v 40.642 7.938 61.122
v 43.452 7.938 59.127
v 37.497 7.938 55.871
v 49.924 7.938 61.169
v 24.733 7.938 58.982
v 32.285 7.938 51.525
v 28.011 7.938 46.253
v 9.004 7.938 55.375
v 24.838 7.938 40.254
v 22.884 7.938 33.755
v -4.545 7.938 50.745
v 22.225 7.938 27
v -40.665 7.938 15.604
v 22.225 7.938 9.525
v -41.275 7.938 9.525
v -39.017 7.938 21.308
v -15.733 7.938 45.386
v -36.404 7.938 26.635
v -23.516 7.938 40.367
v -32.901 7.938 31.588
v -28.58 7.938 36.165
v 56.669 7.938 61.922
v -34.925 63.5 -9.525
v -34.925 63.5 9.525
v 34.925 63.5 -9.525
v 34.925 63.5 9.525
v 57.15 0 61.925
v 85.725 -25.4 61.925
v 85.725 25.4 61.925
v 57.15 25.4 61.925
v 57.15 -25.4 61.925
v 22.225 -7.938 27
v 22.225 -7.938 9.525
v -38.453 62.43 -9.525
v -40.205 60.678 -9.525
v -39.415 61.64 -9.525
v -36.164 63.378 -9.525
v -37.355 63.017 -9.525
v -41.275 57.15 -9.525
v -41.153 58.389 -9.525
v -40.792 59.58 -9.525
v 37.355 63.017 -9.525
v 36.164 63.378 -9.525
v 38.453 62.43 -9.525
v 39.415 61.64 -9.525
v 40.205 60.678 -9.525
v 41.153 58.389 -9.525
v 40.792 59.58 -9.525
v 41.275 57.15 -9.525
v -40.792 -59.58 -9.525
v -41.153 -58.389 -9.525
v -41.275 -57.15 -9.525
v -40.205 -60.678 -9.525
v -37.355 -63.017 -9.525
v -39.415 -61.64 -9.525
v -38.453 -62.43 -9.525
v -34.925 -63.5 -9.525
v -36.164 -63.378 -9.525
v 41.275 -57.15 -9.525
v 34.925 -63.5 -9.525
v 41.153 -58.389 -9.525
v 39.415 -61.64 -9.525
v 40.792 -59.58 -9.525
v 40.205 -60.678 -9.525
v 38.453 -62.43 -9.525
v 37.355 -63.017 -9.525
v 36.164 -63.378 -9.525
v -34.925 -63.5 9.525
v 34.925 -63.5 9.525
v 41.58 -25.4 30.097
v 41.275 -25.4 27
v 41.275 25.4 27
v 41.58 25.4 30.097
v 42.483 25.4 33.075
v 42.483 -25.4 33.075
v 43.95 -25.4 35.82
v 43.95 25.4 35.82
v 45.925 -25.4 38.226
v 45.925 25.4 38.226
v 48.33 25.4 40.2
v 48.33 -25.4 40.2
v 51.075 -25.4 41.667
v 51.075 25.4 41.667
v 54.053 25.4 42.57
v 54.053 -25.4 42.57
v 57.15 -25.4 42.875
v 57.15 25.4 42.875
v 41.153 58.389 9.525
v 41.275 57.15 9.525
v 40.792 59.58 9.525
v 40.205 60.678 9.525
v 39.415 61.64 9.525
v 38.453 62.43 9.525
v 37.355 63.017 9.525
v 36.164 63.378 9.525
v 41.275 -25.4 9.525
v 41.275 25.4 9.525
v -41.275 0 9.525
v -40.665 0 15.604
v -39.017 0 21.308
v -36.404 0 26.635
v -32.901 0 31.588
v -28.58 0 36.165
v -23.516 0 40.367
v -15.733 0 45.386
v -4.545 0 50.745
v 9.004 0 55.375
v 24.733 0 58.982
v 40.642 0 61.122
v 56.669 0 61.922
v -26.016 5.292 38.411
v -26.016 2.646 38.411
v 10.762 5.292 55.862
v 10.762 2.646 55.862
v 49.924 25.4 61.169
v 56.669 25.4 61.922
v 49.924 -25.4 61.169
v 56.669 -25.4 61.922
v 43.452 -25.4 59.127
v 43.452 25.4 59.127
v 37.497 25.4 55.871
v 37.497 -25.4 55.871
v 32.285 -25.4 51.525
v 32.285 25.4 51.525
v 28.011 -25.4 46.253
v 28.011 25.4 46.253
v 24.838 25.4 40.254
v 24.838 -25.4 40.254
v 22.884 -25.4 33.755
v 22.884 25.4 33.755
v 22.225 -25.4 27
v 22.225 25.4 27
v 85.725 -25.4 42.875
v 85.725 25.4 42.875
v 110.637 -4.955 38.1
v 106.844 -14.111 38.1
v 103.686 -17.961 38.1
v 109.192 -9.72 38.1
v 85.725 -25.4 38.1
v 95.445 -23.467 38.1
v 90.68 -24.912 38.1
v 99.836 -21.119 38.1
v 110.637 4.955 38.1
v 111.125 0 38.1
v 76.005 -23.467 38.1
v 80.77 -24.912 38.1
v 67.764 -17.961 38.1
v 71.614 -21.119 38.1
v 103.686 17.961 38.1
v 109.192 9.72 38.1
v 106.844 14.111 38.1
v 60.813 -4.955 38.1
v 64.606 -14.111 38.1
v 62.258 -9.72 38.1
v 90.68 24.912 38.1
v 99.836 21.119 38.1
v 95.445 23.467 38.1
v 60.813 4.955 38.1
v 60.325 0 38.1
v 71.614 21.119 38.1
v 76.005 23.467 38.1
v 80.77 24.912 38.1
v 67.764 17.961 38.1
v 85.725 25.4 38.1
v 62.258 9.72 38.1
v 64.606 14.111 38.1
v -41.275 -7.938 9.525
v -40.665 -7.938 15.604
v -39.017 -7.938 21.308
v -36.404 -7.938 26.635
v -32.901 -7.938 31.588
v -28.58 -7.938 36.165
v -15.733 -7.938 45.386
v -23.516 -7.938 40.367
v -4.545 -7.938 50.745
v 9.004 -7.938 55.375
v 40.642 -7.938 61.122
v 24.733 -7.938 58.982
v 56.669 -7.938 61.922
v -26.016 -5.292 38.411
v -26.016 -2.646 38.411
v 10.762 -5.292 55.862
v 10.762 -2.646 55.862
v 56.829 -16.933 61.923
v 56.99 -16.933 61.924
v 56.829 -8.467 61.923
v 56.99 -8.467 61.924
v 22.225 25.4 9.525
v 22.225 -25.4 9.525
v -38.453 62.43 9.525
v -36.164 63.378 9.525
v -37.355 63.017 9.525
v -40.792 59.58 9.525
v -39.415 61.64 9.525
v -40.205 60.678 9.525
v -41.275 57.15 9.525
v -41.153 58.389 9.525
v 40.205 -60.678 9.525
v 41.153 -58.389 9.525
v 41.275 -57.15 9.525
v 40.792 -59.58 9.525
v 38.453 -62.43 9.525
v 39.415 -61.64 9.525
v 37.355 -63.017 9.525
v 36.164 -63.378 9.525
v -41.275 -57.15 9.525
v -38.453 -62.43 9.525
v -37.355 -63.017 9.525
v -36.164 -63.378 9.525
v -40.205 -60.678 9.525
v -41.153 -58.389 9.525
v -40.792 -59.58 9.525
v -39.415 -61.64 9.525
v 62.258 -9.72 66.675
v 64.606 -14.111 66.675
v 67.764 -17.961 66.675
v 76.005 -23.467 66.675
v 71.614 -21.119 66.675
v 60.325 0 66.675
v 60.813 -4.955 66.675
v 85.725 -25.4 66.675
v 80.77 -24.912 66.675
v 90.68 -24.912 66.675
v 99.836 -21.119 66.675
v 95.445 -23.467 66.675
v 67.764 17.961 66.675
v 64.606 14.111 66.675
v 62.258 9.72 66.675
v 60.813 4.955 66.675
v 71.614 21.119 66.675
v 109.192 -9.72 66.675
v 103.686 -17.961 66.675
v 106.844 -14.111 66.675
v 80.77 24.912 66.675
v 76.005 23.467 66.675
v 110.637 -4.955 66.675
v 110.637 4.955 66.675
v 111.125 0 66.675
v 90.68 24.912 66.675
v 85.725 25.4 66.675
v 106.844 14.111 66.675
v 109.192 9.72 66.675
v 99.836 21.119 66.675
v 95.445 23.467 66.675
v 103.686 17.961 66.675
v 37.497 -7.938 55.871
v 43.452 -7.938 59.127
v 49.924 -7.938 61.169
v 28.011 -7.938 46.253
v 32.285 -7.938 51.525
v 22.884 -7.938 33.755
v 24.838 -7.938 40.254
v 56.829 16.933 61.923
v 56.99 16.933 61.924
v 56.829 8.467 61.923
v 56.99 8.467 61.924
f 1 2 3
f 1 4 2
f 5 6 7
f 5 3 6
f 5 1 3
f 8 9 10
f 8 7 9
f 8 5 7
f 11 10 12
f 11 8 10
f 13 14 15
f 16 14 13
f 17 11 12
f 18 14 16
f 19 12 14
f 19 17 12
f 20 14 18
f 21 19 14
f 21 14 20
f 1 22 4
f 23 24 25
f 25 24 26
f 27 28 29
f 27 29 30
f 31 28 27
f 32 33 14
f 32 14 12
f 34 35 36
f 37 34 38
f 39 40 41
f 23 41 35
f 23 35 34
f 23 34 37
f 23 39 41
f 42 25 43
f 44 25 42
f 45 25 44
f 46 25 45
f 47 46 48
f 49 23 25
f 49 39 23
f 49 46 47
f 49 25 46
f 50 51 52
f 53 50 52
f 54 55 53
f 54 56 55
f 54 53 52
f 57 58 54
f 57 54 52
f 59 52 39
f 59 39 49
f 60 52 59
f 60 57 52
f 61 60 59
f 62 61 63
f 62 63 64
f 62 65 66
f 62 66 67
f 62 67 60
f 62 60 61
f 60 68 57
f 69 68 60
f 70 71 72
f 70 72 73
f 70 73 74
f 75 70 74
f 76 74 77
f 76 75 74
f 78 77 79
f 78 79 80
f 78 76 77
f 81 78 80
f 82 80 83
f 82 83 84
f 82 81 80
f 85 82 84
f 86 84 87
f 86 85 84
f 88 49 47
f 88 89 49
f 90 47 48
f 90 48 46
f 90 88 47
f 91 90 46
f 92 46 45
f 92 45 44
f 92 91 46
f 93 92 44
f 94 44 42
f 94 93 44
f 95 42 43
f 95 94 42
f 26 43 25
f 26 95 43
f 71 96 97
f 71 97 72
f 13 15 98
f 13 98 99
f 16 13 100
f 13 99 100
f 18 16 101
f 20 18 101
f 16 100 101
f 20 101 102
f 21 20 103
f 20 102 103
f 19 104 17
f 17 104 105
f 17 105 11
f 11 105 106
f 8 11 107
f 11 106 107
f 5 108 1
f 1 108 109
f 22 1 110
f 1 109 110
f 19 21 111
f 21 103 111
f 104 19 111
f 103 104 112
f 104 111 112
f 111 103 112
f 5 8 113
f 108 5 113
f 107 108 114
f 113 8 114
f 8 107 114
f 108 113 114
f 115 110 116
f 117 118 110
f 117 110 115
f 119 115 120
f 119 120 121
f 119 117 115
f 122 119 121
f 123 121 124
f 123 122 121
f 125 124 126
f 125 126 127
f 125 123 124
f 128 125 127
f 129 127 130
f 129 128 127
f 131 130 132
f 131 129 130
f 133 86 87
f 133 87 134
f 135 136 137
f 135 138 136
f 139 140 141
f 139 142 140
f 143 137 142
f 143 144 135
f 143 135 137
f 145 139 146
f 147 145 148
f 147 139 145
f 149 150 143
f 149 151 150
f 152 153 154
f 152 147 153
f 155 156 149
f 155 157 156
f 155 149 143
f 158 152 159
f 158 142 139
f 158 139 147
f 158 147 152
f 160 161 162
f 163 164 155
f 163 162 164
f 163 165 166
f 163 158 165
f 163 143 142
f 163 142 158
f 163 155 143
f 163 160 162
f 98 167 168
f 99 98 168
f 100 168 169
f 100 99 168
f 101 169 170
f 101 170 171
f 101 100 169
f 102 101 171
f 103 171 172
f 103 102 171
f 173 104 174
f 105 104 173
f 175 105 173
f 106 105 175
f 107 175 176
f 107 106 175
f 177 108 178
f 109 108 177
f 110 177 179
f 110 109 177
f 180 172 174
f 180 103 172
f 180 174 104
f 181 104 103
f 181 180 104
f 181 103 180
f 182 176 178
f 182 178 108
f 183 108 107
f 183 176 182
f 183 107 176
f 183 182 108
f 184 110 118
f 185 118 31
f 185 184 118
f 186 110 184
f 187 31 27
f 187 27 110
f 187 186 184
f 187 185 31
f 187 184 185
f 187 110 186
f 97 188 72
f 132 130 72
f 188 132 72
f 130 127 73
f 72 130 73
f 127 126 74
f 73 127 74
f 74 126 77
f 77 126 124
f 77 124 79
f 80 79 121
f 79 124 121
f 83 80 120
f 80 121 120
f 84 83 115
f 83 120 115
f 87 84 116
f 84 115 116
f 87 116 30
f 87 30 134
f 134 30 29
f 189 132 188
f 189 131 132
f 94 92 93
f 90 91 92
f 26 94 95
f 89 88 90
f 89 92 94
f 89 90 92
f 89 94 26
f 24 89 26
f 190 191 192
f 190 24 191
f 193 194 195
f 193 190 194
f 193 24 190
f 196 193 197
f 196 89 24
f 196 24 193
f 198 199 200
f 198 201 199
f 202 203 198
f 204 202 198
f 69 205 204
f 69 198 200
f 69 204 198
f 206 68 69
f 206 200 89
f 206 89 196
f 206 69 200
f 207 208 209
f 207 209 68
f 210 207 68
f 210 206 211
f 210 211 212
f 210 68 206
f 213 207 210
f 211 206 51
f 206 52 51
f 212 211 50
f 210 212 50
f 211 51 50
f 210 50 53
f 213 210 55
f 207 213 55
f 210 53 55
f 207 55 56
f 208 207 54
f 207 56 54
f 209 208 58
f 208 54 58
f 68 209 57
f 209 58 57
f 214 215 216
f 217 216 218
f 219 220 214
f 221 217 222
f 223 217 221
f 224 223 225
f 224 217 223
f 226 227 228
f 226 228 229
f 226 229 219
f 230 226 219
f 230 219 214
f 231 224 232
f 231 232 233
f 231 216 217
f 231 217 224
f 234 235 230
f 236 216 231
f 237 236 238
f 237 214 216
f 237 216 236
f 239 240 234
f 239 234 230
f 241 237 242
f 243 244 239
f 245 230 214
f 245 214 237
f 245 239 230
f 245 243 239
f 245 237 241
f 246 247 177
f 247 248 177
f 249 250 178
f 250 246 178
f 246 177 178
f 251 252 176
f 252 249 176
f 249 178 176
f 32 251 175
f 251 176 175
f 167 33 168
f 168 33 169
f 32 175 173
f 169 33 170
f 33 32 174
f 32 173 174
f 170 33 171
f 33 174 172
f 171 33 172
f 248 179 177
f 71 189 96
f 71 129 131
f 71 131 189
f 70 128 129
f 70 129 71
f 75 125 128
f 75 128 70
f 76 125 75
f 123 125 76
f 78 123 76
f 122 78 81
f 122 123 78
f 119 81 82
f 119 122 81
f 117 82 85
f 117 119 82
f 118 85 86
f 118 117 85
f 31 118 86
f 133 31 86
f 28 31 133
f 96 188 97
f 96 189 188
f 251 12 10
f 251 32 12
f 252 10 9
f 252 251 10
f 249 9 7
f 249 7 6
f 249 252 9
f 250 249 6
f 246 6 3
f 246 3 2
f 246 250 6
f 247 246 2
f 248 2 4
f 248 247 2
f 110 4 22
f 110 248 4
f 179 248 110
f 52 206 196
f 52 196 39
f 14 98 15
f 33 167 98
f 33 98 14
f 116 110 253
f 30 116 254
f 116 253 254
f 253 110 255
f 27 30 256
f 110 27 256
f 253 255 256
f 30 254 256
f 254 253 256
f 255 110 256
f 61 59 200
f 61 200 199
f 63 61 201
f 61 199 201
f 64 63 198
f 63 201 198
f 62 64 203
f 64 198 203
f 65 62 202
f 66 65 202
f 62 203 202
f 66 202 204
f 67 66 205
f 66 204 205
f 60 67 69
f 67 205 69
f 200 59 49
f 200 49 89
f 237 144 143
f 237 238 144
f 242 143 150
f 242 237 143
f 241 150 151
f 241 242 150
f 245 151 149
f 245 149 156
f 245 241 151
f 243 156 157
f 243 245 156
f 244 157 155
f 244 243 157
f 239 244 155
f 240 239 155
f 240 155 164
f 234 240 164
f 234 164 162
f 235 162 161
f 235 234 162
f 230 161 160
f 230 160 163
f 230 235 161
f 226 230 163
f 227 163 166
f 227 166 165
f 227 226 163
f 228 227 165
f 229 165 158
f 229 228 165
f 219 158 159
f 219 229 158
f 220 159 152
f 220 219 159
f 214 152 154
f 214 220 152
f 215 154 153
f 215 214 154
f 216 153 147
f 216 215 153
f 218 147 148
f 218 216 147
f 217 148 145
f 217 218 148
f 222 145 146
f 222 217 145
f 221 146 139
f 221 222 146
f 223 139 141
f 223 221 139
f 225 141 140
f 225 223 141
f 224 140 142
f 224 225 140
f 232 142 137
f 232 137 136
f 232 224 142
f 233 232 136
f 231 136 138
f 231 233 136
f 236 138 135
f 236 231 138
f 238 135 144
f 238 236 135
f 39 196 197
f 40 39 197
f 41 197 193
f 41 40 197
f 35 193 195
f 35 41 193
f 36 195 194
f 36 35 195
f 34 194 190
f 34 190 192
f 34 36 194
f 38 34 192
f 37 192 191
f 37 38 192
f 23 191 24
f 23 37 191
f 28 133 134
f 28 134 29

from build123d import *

# Parameters (mm, degrees)
F1_DEPTH = 63.5
F0_W     = 25.4
F0_H     = 19.05
F2_DEPTH = 25.4
F3_DEPTH = 7.9375
F5_R     = 6.35


with BuildPart() as f1:
    # F0 (on Front) → F1 (new body, symmetric)
    with BuildSketch(Plane.XZ):
        Polygon((-41.275, 9.525), (-41.275, -9.525), (41.275, -9.525), (41.275, 9.525), (22.225, 9.525), align=None)
    extrude(amount=F1_DEPTH, both=True)

    # F5
    f5_edges = [f1.edges().sort_by_distance(p)[0] for p in [
        (41.275, -63.5, 0),
        (41.275, 63.5, 0),
        (-41.275, 63.5, 0),
        (-41.275, -63.5, 0),
    ]]
    fillet(f5_edges, radius=F5_R)


with BuildPart() as f2:
    # F0 (on Front) → F2 (new body, symmetric)
    with BuildSketch(Plane.XZ):
        with BuildLine():
            Line((22.225, 9.525), (41.275, 9.525))
            Line((41.275, 9.525), (41.275, 27.0002))
            ThreePointArc((41.275, 27.0002), (45.9246798487, 38.2255201513), (57.15, 42.8752))
            Line((57.15, 42.8752), (60.325, 42.8752))
            Line((60.325, 42.8752), (60.325, 61.9252))
            Line((60.325, 61.9252), (57.15, 61.9252))
            add(Edge.make_bspline(
                [(56.6686169782, 61.9218823104), (56.8291375068, 61.9231924498), (56.9895992867, 61.9242983436), (57.15, 61.9252)],
                knots=[111.1196193443, 111.1196193443, 111.1196193443, 111.1196193443, 111.5045361635, 111.5045361635, 111.5045361635, 111.5045361635], degree=3))
            ThreePointArc((56.6686169782, 61.9218823104), (32.2846835227, 51.5251191942), (22.225, 27.0002))
            Line((22.225, 27.0002), (22.225, 9.525))
        make_face()
        with Locations((73.025, 52.4002)):
            Rectangle(F0_W, F0_H)
    extrude(amount=F2_DEPTH, both=True)


with BuildPart() as f3:
    # F0 (on Front) → F3 (new body, symmetric)
    with BuildSketch(Plane.XZ):
        with BuildLine():
            add(Edge.make_bspline(
                [(-41.275, 9.525), (-40.9070964811, 44.1438460137), (10.3287868037, 61.5436650302), (56.6686169782, 61.9218823104)],
                knots=[0, 0, 0, 0, 111.1196193443, 111.1196193443, 111.1196193443, 111.1196193443], degree=3))
            Line((-41.275, 9.525), (22.225, 9.525))
            Line((22.225, 9.525), (22.225, 27.0002))
            ThreePointArc((22.225, 27.0002), (32.2846835227, 51.5251191942), (56.6686169782, 61.9218823104))
        make_face()
    extrude(amount=F3_DEPTH, both=True)


with BuildPart() as f4:
    # F0 (on Front) → F4 (revolve)
    with BuildSketch(Plane.XZ):
        Polygon((85.725, 66.675), (85.725, 61.9252), (85.725, 42.8752), (85.725, 38.1), (111.125, 38.1), (111.125, 66.675), align=None)
    revolve(axis=Axis((85.725, 0, 52.3875), (0, 0, 1)))


solid = Compound([f1.part, f2.part, f3.part, f4.part])
